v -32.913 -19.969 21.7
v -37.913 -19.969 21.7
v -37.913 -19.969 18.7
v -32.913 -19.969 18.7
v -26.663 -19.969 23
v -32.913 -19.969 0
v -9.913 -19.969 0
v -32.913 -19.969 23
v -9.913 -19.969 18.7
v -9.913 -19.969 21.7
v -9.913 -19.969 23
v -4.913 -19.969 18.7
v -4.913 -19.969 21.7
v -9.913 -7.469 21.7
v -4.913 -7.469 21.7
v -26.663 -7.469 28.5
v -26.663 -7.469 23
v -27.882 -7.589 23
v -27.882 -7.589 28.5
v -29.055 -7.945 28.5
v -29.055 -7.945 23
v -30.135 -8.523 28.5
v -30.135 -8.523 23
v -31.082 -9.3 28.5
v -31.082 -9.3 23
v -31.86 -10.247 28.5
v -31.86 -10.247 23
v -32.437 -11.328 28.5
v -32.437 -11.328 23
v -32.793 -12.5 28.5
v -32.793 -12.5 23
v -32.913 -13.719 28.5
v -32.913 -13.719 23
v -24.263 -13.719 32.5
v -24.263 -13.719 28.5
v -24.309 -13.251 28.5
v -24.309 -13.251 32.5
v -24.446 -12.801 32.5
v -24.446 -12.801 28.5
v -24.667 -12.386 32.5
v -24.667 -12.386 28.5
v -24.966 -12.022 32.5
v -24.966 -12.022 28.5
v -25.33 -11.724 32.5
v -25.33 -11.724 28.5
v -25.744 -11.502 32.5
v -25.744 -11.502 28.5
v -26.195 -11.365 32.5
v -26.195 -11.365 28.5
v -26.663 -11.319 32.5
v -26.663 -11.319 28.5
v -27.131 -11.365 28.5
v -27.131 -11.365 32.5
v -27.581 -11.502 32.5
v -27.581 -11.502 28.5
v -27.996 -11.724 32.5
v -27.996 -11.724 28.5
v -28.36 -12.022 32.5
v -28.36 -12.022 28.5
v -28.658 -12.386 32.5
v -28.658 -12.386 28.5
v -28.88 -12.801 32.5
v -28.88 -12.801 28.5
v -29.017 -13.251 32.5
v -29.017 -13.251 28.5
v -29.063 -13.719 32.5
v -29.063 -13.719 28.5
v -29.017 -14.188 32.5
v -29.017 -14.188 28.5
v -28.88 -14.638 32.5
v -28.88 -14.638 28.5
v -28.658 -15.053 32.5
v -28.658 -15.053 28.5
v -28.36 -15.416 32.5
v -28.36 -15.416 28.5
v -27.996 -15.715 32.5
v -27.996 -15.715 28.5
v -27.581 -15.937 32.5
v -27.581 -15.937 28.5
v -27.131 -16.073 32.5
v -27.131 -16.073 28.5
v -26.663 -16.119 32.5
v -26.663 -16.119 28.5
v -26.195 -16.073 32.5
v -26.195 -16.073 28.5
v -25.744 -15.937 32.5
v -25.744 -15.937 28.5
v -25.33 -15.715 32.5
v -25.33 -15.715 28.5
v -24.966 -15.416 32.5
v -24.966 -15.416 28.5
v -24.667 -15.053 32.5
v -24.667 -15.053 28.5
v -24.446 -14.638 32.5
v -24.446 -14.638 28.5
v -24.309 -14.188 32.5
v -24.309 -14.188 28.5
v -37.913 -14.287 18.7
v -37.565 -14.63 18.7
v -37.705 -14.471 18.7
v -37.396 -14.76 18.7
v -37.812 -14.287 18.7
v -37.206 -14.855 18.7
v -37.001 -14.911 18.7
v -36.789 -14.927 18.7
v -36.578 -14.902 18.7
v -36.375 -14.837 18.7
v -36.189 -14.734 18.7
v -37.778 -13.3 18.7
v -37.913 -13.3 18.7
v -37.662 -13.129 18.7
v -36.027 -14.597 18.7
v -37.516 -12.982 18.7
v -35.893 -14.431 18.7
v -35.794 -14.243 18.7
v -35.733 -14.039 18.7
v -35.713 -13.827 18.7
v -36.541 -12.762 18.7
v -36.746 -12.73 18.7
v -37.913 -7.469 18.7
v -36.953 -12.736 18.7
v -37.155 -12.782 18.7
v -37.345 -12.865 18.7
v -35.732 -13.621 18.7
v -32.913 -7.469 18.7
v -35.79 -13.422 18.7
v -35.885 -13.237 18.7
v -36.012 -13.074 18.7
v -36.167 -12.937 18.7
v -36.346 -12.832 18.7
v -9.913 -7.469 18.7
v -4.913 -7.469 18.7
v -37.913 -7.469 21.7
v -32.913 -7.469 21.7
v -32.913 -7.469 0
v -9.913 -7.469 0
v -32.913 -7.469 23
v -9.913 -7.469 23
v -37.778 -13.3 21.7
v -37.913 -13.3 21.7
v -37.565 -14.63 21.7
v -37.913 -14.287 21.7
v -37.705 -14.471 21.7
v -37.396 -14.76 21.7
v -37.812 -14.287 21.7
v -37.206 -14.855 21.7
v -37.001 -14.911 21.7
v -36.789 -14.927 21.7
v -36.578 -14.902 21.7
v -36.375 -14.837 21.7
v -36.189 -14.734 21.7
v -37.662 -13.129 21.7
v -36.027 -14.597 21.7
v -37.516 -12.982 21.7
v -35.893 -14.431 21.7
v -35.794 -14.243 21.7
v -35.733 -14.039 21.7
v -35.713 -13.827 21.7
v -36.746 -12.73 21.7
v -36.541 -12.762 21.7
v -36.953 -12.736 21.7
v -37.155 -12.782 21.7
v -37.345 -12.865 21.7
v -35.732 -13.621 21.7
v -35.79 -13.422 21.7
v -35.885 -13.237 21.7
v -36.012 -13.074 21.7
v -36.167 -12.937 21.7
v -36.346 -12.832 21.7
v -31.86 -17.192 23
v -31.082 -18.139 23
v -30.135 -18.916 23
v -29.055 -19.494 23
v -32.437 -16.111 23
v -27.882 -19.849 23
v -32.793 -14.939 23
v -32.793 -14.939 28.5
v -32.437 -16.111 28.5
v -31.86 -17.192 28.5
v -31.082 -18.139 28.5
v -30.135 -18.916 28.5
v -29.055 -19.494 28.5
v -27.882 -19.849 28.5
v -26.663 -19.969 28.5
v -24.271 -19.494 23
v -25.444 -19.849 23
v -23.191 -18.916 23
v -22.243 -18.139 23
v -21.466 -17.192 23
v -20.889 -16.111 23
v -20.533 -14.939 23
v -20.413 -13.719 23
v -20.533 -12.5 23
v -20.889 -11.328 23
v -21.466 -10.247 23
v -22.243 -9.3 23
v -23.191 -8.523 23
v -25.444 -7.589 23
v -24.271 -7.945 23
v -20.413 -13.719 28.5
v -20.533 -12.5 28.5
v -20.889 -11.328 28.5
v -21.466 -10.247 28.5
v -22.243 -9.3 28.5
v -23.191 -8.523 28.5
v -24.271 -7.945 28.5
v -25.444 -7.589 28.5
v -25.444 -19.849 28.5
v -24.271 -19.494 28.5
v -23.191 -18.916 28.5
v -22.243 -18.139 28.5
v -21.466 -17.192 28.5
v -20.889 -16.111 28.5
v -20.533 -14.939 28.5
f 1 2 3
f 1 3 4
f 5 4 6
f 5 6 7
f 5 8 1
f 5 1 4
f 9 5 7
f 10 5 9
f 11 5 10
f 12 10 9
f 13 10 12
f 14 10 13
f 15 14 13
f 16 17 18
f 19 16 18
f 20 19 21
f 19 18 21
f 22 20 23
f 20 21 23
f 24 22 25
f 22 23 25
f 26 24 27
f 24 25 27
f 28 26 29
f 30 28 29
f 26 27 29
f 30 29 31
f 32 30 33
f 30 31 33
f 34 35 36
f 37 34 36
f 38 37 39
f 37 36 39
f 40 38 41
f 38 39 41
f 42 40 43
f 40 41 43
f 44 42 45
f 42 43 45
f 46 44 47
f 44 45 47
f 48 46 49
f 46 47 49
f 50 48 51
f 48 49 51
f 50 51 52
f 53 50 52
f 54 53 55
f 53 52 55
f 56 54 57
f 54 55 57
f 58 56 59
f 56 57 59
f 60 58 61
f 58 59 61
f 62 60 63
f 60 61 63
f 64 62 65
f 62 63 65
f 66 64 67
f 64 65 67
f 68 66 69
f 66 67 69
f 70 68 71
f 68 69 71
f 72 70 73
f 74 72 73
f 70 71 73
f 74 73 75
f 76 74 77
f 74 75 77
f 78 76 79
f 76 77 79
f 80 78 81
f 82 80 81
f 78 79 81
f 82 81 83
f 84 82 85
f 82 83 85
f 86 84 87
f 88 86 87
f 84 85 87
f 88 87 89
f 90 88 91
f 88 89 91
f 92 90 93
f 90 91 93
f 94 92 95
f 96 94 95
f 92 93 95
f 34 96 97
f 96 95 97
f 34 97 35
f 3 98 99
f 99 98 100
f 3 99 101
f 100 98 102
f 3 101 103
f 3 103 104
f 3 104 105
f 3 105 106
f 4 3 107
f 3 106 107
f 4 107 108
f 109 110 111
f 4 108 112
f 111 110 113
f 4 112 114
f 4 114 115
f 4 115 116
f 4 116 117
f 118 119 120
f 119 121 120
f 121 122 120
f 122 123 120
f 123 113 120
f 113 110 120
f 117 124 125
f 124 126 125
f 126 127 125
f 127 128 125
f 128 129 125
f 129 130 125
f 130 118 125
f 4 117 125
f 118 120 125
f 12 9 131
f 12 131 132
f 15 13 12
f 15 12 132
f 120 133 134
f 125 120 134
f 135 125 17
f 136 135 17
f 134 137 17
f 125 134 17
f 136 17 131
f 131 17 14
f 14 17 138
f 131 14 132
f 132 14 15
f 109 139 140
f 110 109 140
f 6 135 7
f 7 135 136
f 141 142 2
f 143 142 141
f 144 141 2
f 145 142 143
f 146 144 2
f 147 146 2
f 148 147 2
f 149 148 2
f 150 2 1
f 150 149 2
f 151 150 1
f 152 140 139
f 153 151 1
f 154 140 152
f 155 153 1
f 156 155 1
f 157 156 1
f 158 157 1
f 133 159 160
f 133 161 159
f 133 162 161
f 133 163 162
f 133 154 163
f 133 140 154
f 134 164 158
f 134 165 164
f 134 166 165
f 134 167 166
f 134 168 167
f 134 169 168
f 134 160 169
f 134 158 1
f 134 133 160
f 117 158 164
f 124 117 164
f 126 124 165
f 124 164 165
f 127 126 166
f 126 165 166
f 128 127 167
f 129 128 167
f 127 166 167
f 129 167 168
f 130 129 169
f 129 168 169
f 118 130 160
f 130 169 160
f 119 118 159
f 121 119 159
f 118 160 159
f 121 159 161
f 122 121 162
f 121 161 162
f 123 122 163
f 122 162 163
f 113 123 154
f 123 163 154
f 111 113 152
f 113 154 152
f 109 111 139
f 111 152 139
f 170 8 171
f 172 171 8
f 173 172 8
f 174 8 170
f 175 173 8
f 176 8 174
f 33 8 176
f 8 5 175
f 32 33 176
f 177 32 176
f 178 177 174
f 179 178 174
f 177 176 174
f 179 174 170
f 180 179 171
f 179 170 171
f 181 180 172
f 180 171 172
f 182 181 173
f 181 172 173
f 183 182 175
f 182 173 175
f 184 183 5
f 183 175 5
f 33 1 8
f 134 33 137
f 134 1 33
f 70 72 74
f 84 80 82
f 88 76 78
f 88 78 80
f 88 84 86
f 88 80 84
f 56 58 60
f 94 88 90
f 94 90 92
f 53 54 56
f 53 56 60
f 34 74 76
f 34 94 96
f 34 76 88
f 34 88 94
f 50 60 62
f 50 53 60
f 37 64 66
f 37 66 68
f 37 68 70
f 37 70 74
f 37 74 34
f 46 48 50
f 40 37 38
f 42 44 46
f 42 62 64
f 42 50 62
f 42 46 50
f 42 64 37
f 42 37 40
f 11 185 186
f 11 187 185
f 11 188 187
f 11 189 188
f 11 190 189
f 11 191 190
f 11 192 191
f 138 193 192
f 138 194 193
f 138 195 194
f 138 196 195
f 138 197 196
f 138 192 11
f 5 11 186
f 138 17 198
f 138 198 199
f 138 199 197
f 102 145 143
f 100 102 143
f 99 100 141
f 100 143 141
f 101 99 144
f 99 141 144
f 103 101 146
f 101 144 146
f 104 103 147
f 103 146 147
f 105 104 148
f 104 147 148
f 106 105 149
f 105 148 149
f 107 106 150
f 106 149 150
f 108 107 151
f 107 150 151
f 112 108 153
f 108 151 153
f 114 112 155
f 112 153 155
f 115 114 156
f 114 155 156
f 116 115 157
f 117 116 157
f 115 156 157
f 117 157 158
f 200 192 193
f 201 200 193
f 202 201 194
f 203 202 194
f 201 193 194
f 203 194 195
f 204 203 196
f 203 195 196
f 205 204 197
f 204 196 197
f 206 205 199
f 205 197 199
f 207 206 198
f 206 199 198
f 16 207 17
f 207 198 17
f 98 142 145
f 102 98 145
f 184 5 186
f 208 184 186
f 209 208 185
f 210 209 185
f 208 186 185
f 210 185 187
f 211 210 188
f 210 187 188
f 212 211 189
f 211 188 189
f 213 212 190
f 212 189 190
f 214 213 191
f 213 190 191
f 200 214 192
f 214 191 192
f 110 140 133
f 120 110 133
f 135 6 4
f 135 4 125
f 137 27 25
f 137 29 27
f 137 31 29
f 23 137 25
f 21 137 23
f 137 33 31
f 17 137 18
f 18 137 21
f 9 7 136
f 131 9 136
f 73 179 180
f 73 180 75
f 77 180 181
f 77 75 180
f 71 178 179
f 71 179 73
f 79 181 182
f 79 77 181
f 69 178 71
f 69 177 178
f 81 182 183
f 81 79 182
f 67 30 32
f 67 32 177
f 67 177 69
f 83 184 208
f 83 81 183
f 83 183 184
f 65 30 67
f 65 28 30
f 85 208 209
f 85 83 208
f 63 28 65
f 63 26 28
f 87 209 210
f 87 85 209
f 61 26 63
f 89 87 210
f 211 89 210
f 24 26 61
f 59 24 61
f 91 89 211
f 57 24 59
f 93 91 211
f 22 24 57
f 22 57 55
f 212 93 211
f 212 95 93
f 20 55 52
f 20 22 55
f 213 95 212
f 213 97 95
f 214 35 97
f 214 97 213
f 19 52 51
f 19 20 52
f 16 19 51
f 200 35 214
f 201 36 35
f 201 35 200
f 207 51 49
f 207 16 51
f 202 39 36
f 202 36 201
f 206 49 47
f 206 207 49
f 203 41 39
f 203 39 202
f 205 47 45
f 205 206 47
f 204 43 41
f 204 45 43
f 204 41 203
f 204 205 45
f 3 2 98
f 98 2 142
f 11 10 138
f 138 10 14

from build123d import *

# Parameters (mm, degrees)
F0_W      = 23
F0_H      = 12.5
F1_DEPTH  = 23
F3_W      = 33
F3_H      = 12.5
F4_DEPTH  = 3
F6_DEPTH  = 5.5
F7_R      = 2.4
F8_DEPTH  = 4
F10_DEPTH = 25


with BuildPart() as f1:
    # F0 (on Top) → F1 (new body)
    with BuildSketch(Plane.XY):
        with Locations((-21.4128988087, -13.7193646282)):
            Rectangle(F0_W, F0_H)
    extrude(amount=F1_DEPTH)

    # F3 (on offset) → F4 (join)
    with BuildSketch(Plane.XY.offset(21.7)):
        with Locations((-21.4128988087, -13.7193646282)):
            Rectangle(F3_W, F3_H)
    extrude(amount=-F4_DEPTH)

    # F5 (on face) → F6 (join)
    with BuildSketch(Plane.XY.offset(23)):
        with BuildLine():
            ThreePointArc((-26.6628988087, -19.9693646282), (-22.2434814263, -18.1387820106), (-20.4128988087, -13.7193646282))
            ThreePointArc((-20.4128988087, -13.7193646282), (-22.2434814263, -9.2999472458), (-26.6628988087, -7.4693646282))
            ThreePointArc((-26.6628988087, -7.4693646282), (-31.0823161911, -9.2999472458), (-32.9128988087, -13.7193646282))
            ThreePointArc((-32.9128988087, -13.7193646282), (-31.0823161911, -18.1387820106), (-26.6628988087, -19.9693646282))
        make_face()
    extrude(amount=F6_DEPTH)

    # F7 (on face) → F8 (join)
    with BuildSketch(Plane.XY.offset(28.5)):
        with Locations((-26.6628988087, -13.7193646282)):
            Circle(F7_R)
    extrude(amount=F8_DEPTH)

    # F9 (on face) → F10 (cut)
    with BuildSketch(Plane.XY.offset(21.7)):
        with BuildLine():
            ThreePointArc((-37.8123308197, -14.2869679257), (-36.5777129376, -14.9020368395), (-35.7128988087, -13.8274729252))
            ThreePointArc((-35.7128988087, -13.8274729252), (-36.5409103144, -12.7616294756), (-37.778393825, -13.3003871888))
            Line((-37.778393825, -13.3003871888), (-37.1418111026, -13.3003871888))
            Line((-37.1418111026, -13.3003871888), (-37.1418111026, -13.7193646282))
            Line((-37.1418111026, -13.7193646282), (-37.1418111026, -14.2869679257))
            Line((-37.1418111026, -14.2869679257), (-37.8123308197, -14.2869679257))
        make_face()
        with BuildLine():
            Line((-37.1418111026, -13.3003871888), (-37.778393825, -13.3003871888))
            ThreePointArc((-37.778393825, -13.3003871888), (-37.8640697227, -13.5033746227), (-37.9075734618, -13.7193646282))
            Line((-37.9075734618, -13.7193646282), (-37.1418111026, -13.7193646282))
            Line((-37.1418111026, -13.7193646282), (-37.1418111026, -13.3003871888))
        make_face()
        with BuildLine():
            ThreePointArc((-37.9075734618, -13.7193646282), (-37.8640697227, -13.5033746227), (-37.778393825, -13.3003871888))
            Line((-37.778393825, -13.3003871888), (-38.5551899672, -13.3003871888))
            Line((-38.5551899672, -13.3003871888), (-38.5551899672, -13.7193646282))
            Line((-38.5551899672, -13.7193646282), (-37.9075734618, -13.7193646282))
        make_face()
        with BuildLine():
            Line((-38.5551899672, -14.2869679257), (-37.8123308197, -14.2869679257))
            ThreePointArc((-37.8123308197, -14.2869679257), (-37.8977324623, -14.0095057356), (-37.9075734618, -13.7193646282))
            Line((-37.9075734618, -13.7193646282), (-38.5551899672, -13.7193646282))
            Line((-38.5551899672, -13.7193646282), (-38.5551899672, -14.2869679257))
        make_face()
        with BuildLine():
            ThreePointArc((-37.9075734618, -13.7193646282), (-37.8977324623, -14.0095057356), (-37.8123308197, -14.2869679257))
            Line((-37.8123308197, -14.2869679257), (-37.1418111026, -14.2869679257))
            Line((-37.1418111026, -14.2869679257), (-37.1418111026, -13.7193646282))
            Line((-37.1418111026, -13.7193646282), (-37.9075734618, -13.7193646282))
        make_face()
    extrude(amount=-F10_DEPTH, mode=Mode.SUBTRACT)


solid = f1.part
